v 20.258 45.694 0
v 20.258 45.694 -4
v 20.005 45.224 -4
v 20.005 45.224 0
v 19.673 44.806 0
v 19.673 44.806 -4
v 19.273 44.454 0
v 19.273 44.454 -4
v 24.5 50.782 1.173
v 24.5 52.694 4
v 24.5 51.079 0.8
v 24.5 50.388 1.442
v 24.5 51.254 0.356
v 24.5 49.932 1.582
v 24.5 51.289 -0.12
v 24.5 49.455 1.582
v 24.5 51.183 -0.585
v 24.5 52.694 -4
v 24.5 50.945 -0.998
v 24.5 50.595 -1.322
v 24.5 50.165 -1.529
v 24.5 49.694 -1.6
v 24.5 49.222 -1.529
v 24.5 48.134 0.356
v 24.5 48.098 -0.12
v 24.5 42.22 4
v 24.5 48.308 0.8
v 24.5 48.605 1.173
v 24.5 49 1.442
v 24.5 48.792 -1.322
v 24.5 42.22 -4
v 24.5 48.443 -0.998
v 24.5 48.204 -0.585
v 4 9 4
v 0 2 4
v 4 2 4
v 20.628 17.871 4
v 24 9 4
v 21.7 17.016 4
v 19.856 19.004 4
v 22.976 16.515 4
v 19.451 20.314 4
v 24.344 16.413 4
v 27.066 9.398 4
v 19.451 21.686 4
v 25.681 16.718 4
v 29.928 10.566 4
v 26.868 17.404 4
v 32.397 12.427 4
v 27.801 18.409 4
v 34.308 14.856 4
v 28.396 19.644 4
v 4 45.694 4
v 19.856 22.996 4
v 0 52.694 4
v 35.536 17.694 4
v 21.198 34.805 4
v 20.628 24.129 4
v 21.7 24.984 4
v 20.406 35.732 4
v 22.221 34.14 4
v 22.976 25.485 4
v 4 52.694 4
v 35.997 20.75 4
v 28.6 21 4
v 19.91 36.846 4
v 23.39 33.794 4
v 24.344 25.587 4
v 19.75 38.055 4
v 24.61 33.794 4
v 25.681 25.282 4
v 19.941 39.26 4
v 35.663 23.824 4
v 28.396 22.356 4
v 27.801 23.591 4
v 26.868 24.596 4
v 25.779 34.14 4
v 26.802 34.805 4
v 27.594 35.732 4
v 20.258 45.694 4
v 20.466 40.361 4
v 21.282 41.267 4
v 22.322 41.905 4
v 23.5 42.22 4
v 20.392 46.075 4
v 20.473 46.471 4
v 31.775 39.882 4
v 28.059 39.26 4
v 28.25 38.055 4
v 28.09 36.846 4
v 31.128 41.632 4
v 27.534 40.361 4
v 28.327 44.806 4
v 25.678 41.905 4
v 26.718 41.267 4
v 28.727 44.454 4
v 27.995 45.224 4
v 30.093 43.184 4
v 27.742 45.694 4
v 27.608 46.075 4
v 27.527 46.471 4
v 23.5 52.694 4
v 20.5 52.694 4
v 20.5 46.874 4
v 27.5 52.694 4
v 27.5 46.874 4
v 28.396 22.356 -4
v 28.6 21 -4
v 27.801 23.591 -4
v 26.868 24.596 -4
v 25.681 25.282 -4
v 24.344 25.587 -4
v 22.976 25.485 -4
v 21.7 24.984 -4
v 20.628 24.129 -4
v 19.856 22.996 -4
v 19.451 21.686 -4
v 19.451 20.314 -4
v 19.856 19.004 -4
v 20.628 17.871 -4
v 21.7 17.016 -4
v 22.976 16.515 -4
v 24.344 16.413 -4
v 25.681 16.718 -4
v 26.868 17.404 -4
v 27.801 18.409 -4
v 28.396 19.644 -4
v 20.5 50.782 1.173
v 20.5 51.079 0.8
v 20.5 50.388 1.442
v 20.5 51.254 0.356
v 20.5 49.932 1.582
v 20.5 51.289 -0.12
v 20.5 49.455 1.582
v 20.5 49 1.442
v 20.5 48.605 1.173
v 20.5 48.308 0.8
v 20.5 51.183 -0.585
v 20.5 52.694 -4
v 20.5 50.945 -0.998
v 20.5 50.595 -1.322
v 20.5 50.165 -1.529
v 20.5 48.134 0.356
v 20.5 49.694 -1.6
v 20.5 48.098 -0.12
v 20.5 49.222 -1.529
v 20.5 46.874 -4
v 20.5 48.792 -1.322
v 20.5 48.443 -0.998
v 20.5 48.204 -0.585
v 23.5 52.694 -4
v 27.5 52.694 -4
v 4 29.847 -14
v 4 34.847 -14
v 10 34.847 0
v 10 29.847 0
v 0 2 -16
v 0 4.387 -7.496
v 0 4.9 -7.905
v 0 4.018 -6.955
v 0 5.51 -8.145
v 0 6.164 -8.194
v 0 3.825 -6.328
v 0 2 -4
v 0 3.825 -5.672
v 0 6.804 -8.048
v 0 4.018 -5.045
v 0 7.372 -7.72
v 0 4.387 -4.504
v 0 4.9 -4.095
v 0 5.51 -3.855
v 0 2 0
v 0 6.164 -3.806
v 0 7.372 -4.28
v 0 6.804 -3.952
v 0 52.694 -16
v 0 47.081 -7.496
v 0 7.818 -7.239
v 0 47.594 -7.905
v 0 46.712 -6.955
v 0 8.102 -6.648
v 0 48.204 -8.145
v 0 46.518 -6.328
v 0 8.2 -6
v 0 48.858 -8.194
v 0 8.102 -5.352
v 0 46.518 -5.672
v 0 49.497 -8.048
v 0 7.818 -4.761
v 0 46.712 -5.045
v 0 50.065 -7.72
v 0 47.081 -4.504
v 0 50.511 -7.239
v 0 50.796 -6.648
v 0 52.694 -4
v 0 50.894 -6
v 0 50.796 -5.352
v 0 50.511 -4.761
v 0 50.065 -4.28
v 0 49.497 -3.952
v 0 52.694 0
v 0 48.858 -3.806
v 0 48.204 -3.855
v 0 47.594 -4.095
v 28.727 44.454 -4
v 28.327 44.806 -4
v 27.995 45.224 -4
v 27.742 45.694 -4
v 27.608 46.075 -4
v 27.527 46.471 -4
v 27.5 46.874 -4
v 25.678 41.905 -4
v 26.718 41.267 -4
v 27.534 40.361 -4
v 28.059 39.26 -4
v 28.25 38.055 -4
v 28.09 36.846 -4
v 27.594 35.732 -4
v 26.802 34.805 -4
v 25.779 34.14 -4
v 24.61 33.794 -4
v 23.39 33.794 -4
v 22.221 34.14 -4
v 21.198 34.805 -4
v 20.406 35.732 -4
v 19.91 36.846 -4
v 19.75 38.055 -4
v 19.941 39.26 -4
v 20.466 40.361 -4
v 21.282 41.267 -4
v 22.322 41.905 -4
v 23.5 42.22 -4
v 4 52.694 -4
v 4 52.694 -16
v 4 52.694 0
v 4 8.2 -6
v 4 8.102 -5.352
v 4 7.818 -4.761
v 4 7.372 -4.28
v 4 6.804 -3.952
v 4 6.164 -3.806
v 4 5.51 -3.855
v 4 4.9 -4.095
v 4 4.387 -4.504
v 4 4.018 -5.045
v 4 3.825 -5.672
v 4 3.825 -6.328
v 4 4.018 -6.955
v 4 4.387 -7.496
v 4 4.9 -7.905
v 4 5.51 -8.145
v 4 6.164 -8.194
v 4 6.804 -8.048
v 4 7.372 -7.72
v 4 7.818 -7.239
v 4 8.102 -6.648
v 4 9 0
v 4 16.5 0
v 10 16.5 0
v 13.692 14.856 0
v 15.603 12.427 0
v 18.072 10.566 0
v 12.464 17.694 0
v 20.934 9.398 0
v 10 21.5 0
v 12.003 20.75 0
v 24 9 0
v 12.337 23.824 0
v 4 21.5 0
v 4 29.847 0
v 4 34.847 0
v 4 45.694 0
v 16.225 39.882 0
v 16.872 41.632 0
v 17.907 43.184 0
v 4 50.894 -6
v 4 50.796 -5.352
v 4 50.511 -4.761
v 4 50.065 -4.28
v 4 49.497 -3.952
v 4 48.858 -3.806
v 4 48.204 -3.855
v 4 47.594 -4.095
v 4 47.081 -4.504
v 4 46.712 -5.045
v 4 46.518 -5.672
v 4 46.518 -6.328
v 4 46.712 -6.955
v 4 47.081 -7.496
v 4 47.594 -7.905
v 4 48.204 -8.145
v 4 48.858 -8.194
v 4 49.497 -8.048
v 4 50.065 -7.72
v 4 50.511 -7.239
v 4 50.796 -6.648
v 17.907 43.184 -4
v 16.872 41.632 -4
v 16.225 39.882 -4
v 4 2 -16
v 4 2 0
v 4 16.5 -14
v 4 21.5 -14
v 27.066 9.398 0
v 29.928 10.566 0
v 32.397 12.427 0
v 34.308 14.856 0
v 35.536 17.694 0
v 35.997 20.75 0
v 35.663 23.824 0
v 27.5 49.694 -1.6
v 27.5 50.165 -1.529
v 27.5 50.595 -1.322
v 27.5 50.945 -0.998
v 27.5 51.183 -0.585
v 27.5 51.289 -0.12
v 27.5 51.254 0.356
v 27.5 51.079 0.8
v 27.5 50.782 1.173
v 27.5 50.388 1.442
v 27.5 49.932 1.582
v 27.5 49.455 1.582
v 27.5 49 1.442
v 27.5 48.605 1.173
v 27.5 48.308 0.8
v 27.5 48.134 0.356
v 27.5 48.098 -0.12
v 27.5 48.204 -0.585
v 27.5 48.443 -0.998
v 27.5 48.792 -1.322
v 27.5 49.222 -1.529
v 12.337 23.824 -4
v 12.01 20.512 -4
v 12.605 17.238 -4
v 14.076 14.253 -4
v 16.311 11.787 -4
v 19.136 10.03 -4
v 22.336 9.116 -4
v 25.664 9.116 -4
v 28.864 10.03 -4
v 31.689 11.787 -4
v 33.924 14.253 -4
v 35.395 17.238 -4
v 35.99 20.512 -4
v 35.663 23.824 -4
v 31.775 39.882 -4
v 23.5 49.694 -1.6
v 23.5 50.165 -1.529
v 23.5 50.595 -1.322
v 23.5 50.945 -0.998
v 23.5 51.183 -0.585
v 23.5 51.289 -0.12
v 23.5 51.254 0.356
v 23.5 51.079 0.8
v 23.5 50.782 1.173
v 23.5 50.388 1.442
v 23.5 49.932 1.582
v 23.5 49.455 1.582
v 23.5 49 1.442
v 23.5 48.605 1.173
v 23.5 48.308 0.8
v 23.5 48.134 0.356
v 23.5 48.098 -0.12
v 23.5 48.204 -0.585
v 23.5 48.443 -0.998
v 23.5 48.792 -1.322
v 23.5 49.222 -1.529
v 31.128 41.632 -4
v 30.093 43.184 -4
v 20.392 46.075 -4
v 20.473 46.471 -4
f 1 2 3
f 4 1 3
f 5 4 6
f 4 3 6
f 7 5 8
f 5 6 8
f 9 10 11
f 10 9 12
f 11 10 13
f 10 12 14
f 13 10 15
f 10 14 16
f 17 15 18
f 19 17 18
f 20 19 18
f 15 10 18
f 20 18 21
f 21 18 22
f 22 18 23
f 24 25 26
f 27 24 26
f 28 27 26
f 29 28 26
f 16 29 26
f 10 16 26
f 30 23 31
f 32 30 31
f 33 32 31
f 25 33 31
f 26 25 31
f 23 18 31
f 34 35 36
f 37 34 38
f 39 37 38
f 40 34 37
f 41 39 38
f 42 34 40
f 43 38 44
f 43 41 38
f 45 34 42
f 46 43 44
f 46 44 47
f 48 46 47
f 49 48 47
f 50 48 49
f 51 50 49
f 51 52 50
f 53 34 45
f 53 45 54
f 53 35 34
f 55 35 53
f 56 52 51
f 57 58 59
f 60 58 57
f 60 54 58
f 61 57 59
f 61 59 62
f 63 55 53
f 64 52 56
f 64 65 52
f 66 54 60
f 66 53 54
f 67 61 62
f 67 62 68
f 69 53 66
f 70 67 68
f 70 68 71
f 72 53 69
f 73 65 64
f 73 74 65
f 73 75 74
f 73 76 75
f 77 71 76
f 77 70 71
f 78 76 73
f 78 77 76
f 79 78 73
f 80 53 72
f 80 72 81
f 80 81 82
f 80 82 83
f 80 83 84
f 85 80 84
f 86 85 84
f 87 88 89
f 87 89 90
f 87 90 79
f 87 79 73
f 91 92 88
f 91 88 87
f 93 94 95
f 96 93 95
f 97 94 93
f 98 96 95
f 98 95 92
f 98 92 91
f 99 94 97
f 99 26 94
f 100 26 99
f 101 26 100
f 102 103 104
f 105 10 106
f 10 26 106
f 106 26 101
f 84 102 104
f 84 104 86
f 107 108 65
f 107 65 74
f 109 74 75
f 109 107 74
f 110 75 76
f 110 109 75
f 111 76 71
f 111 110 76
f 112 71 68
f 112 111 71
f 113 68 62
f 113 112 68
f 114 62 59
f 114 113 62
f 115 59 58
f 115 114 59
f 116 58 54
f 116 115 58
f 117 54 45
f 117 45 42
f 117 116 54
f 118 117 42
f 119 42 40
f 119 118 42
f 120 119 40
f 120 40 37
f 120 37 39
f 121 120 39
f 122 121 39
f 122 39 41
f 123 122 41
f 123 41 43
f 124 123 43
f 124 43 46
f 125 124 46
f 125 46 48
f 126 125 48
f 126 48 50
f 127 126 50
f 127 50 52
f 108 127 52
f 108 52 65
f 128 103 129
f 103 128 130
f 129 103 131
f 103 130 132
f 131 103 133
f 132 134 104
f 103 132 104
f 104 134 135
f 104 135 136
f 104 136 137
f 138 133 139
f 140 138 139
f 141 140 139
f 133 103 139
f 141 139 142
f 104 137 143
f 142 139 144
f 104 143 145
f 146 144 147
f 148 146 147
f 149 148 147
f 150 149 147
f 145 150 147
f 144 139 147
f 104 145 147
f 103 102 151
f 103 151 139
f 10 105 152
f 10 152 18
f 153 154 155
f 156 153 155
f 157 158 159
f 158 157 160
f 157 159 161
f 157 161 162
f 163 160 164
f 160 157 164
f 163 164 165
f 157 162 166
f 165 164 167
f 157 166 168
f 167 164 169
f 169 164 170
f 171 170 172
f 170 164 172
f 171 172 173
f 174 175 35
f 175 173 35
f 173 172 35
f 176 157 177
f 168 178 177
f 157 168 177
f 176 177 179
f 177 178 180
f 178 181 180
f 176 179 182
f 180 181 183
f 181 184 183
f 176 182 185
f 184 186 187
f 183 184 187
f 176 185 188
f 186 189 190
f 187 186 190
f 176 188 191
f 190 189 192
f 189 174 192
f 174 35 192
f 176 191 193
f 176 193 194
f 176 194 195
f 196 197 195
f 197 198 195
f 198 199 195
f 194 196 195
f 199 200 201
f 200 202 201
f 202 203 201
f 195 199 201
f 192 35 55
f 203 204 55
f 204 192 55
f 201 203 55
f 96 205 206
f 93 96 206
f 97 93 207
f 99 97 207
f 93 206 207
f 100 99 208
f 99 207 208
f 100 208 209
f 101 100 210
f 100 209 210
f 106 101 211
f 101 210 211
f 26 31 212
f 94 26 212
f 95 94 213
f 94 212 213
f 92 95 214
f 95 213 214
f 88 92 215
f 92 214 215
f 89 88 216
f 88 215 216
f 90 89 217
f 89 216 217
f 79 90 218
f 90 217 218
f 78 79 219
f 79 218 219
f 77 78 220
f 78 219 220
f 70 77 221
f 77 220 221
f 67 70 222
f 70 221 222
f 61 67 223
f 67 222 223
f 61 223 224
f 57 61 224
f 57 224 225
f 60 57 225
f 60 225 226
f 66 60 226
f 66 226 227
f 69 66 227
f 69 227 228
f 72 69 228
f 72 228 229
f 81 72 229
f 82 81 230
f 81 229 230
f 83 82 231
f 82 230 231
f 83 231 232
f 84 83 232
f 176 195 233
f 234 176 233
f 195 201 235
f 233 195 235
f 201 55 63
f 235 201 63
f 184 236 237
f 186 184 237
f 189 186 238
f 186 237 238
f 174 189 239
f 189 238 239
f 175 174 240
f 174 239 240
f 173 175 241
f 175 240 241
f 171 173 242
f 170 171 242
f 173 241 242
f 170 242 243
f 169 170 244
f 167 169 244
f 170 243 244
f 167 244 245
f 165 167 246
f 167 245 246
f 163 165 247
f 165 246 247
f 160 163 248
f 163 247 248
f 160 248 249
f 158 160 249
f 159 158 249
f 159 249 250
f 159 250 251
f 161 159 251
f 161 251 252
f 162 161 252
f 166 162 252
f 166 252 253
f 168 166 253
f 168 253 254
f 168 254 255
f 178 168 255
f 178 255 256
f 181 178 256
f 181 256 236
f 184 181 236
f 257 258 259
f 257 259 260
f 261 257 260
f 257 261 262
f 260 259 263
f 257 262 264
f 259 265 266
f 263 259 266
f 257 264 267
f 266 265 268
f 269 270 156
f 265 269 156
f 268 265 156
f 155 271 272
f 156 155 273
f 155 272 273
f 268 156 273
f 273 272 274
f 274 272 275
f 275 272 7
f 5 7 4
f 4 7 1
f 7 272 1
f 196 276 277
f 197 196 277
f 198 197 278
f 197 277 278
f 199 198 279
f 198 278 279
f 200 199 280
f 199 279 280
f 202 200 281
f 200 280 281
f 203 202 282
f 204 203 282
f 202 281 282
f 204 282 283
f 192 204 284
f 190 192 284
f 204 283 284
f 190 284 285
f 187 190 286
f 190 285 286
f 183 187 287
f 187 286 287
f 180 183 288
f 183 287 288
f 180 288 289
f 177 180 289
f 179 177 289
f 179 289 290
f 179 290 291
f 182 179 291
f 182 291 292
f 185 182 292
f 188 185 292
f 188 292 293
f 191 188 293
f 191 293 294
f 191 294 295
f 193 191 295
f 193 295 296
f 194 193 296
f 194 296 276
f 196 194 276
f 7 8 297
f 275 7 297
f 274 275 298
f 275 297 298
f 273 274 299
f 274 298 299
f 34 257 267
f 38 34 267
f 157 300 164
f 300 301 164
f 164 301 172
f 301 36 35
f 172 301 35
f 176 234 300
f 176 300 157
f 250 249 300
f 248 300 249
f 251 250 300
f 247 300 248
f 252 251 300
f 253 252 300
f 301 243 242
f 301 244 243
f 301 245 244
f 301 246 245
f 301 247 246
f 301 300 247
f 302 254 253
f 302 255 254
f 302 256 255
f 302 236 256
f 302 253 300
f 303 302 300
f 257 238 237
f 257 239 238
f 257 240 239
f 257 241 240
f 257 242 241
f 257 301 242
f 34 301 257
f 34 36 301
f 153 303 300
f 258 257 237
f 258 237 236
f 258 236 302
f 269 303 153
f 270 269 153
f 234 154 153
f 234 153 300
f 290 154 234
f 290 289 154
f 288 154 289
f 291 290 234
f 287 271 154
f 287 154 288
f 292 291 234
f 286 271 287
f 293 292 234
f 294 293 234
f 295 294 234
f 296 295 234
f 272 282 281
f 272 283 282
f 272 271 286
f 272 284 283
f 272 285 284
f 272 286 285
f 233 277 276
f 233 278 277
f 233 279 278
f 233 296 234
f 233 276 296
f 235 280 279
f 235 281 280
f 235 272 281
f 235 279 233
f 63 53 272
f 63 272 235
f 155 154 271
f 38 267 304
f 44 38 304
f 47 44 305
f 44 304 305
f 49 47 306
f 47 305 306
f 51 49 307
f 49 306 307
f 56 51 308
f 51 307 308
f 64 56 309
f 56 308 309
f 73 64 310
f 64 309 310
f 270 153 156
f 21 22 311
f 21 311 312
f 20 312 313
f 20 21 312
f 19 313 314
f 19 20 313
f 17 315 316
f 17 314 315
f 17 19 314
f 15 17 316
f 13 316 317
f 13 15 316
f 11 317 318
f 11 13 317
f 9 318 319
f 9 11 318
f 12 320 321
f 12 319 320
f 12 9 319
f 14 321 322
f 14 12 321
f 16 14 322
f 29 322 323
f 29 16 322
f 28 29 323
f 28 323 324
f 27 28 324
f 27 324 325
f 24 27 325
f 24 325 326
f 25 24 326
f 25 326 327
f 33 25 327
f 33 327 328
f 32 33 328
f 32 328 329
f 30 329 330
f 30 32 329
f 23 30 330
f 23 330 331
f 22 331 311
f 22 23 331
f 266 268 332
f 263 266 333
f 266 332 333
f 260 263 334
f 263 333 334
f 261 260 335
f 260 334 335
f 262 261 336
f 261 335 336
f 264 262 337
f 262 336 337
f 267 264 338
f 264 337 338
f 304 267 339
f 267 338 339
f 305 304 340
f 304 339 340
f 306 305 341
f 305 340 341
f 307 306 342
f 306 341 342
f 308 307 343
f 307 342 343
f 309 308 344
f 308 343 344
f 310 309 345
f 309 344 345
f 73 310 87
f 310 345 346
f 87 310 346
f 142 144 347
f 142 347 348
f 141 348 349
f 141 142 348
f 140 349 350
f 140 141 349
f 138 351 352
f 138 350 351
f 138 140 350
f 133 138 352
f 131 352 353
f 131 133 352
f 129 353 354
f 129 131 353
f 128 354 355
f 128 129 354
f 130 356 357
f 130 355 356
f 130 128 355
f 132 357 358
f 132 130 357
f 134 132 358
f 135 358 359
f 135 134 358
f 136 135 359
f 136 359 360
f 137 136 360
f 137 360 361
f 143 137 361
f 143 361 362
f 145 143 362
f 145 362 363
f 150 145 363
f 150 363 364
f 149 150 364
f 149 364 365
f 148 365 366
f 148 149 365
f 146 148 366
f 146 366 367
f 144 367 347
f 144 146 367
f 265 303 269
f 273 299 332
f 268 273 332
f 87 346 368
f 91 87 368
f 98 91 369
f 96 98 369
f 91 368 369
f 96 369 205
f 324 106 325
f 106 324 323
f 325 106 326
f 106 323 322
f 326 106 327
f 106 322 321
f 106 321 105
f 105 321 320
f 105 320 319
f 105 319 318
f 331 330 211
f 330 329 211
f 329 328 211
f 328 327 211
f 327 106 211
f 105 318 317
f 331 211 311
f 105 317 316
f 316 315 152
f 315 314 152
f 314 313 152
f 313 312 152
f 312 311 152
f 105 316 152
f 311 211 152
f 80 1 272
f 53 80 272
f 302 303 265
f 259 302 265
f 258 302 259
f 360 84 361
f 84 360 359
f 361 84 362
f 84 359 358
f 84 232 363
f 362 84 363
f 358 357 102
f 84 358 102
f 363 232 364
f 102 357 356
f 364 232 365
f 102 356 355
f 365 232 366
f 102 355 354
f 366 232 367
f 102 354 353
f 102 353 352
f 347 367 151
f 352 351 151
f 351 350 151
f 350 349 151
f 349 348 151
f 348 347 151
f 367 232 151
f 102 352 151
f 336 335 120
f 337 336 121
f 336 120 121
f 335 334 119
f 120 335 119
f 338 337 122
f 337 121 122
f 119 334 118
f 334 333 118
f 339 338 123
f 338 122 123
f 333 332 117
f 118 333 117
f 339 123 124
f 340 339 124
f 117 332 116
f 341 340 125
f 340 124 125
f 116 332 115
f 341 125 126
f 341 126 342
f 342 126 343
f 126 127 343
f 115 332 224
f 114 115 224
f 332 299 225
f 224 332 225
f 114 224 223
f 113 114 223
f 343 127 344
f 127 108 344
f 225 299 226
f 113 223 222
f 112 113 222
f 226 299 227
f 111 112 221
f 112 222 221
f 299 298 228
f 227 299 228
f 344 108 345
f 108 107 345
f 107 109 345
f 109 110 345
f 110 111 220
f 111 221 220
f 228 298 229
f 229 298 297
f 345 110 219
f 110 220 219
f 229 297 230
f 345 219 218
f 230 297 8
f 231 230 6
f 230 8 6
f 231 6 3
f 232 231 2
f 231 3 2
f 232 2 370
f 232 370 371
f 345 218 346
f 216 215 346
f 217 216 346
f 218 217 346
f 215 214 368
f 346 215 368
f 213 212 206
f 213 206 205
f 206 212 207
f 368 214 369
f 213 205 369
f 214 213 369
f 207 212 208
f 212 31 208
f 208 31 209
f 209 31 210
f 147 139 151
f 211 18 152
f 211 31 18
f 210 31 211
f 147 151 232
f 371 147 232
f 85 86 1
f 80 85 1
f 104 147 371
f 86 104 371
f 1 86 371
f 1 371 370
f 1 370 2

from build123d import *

# Parameters (mm, degrees)
SKETCH_1_R          = 4.6
EXTRUDE_1_DEPTH     = 4
EXTRUDE_START       = -4
SKETCH_1_4_R        = 4.6
SKETCH_1_4_W        = 4
SKETCH_1_4_H        = 50.693747285
EXTRUDE_2_DEPTH     = 4
EXTRUDE_3_DEPTH     = 12
SKETCH_4_R          = 2.2
CUT_EXTRUDE_2_DEPTH = 12
SKETCH_4_3_R        = 1.6
CUT_EXTRUDE_3_DEPTH = 64.691687079
RIB_6_REACH         = 53.839
SKETCH_6_WALL_W     = 120.90928936
SKETCH_6_WALL_H     = 5
RIB_7_REACH         = 51.729
SKETCH_8_WALL_W     = 116.68872775
SKETCH_8_WALL_H     = 5


with BuildPart() as part:
    # 草图1 → 凸台-拉伸1 (new body)
    with BuildSketch(Plane.XY):
        with BuildLine():
            ThreePointArc((20.5, 46.874119675), (20.438884601, 46.271660298), (20.258028466, 45.693747285))
            Line((20.258028466, 45.693747285), (4, 45.693747285))
            Line((4, 45.693747285), (4, 52.693747285))
            Line((4, 52.693747285), (0, 52.693747285))
            Line((0, 52.693747285), (0, 2))
            Line((0, 2), (4, 2))
            Line((4, 2), (4, 9))
            Line((4, 9), (23.999999933, 9))
            ThreePointArc((23.999999933, 9), (33.430862955, 13.579836665), (35.663090571, 23.823529412))
            Line((35.663090571, 23.823529412), (31.775393714, 39.882352941))
            ThreePointArc((31.775393714, 39.882352941), (30.656120461, 42.438024382), (28.727272727, 44.453905218))
            ThreePointArc((28.727272727, 44.453905218), (28.15133251, 45.007636077), (27.741971534, 45.693747285))
            ThreePointArc((27.741971534, 45.693747285), (27.561115399, 46.271660298), (27.5, 46.874119675))
            Line((27.5, 46.874119675), (27.5, 52.693747285))
            Line((27.5, 52.693747285), (24.5, 52.693747285))
            Line((24.5, 52.693747285), (24.5, 42.220485754))
            ThreePointArc((24.5, 42.220485754), (24, 33.75), (23.5, 42.220485754))
            Line((23.5, 42.220485754), (23.5, 52.693747285))
            Line((23.5, 52.693747285), (20.5, 52.693747285))
            Line((20.5, 52.693747285), (20.5, 46.874119675))
        make_face()
        with Locations((24, 21)):
            Circle(SKETCH_1_R, mode=Mode.SUBTRACT)
    extrude(amount=EXTRUDE_1_DEPTH)

    # 草图1<4> → 凸台-拉伸2 (add)
    # profile 1 of 2: a face of its own
    with BuildSketch(Plane.XY.offset(EXTRUDE_START)):
        with BuildLine():
            ThreePointArc((19.272727273, 44.453905218), (17.343879539, 42.438024382), (16.224606286, 39.882352941))
            Line((16.224606286, 39.882352941), (12.336909429, 23.823529412))
            ThreePointArc((12.336909429, 23.823529412), (24, 9), (35.663090571, 23.823529412))
            Line((35.663090571, 23.823529412), (31.775393714, 39.882352941))
            ThreePointArc((31.775393714, 39.882352941), (30.656120461, 42.438024382), (28.727272727, 44.453905218))
            ThreePointArc((28.727272727, 44.453905218), (28.15133251, 45.007636077), (27.741971534, 45.693747285))
            ThreePointArc((27.741971534, 45.693747285), (27.561115399, 46.271660298), (27.5, 46.874119675))
            Line((27.5, 46.874119675), (27.5, 52.693747285))
            Line((27.5, 52.693747285), (24.5, 52.693747285))
            Line((24.5, 52.693747285), (24.5, 42.220485754))
            ThreePointArc((24.5, 42.220485754), (24, 33.75), (23.5, 42.220485754))
            Line((23.5, 42.220485754), (23.5, 52.693747285))
            Line((23.5, 52.693747285), (20.5, 52.693747285))
            Line((20.5, 52.693747285), (20.5, 46.874119675))
            ThreePointArc((20.5, 46.874119675), (20.438884601, 46.271660298), (20.258028466, 45.693747285))
            ThreePointArc((20.258028466, 45.693747285), (19.84866749, 45.007636077), (19.272727273, 44.453905218))
        make_face()
        with Locations((24, 21)):
            Circle(SKETCH_1_4_R, mode=Mode.SUBTRACT)
    # profile 2 of 2: a face of its own
    with BuildSketch(Plane.XY.offset(EXTRUDE_START)):
        with Locations((2, 27.346873643)):
            Rectangle(SKETCH_1_4_W, SKETCH_1_4_H)
    extrude(amount=EXTRUDE_2_DEPTH)

    # 草图1<5> → 凸台-拉伸3 (add)
    with BuildSketch(Plane.XY.offset(EXTRUDE_START)):
        Polygon((4, 45.693747285), (4, 9), (4, 2), (0, 2), (0, 52.693747285), (4, 52.693747285), align=None)
    extrude(amount=-EXTRUDE_3_DEPTH)

    # 草图4 → 切除-拉伸2 (cut)
    with BuildSketch(Plane(origin=(4, 0, 0), x_dir=(0, 0, -1), z_dir=(1, 0, 0))):
        with Locations(Location((6, 48.693747285, 0), (0, 0, 90))):
            Circle(SKETCH_4_R)
        with Locations(Location((6, 6, 0), (0, 0, 90))):
            Circle(SKETCH_4_R)
    extrude(amount=-CUT_EXTRUDE_2_DEPTH, mode=Mode.SUBTRACT)

    # 草图4<3> → 切除-拉伸3 (cut, through all)
    with BuildSketch(Plane(origin=(4, 0, 0), x_dir=(0, 0, -1), z_dir=(1, 0, 0))):
        with Locations((0, 49.693747285)):
            Circle(SKETCH_4_3_R)
    extrude(amount=CUT_EXTRUDE_3_DEPTH, mode=Mode.SUBTRACT)

    # 草图6 wall → 筋6 (add, up to next)
    with BuildSketch(Plane(origin=(7, 19, -7), x_dir=(0.393919298579, 0, 0.919145030018), z_dir=(-0.919145030018, 0, 0.393919298579)), mode=Mode.PRIVATE) as rib_6_sk1:
        Rectangle(SKETCH_6_WALL_W, SKETCH_6_WALL_H)
    rib_6_tool1 = extrude(rib_6_sk1.sketch, amount=RIB_6_REACH, mode=Mode.PRIVATE) - part.part
    add(rib_6_tool1.solids().sort_by_distance((7, 19, -7))[0])

    # 草图8 wall → 筋7 (add, up to next)
    with BuildSketch(Plane(origin=(7, 32.346873642, -7), x_dir=(0.393919298579, 0, 0.919145030018), z_dir=(-0.919145030018, 0, 0.393919298579)), mode=Mode.PRIVATE) as rib_7_sk1:
        Rectangle(SKETCH_8_WALL_W, SKETCH_8_WALL_H)
    rib_7_tool1 = extrude(rib_7_sk1.sketch, amount=RIB_7_REACH, mode=Mode.PRIVATE) - part.part
    add(rib_7_tool1.solids().sort_by_distance((7, 32.346873642, -7))[0])


solid = part.part
